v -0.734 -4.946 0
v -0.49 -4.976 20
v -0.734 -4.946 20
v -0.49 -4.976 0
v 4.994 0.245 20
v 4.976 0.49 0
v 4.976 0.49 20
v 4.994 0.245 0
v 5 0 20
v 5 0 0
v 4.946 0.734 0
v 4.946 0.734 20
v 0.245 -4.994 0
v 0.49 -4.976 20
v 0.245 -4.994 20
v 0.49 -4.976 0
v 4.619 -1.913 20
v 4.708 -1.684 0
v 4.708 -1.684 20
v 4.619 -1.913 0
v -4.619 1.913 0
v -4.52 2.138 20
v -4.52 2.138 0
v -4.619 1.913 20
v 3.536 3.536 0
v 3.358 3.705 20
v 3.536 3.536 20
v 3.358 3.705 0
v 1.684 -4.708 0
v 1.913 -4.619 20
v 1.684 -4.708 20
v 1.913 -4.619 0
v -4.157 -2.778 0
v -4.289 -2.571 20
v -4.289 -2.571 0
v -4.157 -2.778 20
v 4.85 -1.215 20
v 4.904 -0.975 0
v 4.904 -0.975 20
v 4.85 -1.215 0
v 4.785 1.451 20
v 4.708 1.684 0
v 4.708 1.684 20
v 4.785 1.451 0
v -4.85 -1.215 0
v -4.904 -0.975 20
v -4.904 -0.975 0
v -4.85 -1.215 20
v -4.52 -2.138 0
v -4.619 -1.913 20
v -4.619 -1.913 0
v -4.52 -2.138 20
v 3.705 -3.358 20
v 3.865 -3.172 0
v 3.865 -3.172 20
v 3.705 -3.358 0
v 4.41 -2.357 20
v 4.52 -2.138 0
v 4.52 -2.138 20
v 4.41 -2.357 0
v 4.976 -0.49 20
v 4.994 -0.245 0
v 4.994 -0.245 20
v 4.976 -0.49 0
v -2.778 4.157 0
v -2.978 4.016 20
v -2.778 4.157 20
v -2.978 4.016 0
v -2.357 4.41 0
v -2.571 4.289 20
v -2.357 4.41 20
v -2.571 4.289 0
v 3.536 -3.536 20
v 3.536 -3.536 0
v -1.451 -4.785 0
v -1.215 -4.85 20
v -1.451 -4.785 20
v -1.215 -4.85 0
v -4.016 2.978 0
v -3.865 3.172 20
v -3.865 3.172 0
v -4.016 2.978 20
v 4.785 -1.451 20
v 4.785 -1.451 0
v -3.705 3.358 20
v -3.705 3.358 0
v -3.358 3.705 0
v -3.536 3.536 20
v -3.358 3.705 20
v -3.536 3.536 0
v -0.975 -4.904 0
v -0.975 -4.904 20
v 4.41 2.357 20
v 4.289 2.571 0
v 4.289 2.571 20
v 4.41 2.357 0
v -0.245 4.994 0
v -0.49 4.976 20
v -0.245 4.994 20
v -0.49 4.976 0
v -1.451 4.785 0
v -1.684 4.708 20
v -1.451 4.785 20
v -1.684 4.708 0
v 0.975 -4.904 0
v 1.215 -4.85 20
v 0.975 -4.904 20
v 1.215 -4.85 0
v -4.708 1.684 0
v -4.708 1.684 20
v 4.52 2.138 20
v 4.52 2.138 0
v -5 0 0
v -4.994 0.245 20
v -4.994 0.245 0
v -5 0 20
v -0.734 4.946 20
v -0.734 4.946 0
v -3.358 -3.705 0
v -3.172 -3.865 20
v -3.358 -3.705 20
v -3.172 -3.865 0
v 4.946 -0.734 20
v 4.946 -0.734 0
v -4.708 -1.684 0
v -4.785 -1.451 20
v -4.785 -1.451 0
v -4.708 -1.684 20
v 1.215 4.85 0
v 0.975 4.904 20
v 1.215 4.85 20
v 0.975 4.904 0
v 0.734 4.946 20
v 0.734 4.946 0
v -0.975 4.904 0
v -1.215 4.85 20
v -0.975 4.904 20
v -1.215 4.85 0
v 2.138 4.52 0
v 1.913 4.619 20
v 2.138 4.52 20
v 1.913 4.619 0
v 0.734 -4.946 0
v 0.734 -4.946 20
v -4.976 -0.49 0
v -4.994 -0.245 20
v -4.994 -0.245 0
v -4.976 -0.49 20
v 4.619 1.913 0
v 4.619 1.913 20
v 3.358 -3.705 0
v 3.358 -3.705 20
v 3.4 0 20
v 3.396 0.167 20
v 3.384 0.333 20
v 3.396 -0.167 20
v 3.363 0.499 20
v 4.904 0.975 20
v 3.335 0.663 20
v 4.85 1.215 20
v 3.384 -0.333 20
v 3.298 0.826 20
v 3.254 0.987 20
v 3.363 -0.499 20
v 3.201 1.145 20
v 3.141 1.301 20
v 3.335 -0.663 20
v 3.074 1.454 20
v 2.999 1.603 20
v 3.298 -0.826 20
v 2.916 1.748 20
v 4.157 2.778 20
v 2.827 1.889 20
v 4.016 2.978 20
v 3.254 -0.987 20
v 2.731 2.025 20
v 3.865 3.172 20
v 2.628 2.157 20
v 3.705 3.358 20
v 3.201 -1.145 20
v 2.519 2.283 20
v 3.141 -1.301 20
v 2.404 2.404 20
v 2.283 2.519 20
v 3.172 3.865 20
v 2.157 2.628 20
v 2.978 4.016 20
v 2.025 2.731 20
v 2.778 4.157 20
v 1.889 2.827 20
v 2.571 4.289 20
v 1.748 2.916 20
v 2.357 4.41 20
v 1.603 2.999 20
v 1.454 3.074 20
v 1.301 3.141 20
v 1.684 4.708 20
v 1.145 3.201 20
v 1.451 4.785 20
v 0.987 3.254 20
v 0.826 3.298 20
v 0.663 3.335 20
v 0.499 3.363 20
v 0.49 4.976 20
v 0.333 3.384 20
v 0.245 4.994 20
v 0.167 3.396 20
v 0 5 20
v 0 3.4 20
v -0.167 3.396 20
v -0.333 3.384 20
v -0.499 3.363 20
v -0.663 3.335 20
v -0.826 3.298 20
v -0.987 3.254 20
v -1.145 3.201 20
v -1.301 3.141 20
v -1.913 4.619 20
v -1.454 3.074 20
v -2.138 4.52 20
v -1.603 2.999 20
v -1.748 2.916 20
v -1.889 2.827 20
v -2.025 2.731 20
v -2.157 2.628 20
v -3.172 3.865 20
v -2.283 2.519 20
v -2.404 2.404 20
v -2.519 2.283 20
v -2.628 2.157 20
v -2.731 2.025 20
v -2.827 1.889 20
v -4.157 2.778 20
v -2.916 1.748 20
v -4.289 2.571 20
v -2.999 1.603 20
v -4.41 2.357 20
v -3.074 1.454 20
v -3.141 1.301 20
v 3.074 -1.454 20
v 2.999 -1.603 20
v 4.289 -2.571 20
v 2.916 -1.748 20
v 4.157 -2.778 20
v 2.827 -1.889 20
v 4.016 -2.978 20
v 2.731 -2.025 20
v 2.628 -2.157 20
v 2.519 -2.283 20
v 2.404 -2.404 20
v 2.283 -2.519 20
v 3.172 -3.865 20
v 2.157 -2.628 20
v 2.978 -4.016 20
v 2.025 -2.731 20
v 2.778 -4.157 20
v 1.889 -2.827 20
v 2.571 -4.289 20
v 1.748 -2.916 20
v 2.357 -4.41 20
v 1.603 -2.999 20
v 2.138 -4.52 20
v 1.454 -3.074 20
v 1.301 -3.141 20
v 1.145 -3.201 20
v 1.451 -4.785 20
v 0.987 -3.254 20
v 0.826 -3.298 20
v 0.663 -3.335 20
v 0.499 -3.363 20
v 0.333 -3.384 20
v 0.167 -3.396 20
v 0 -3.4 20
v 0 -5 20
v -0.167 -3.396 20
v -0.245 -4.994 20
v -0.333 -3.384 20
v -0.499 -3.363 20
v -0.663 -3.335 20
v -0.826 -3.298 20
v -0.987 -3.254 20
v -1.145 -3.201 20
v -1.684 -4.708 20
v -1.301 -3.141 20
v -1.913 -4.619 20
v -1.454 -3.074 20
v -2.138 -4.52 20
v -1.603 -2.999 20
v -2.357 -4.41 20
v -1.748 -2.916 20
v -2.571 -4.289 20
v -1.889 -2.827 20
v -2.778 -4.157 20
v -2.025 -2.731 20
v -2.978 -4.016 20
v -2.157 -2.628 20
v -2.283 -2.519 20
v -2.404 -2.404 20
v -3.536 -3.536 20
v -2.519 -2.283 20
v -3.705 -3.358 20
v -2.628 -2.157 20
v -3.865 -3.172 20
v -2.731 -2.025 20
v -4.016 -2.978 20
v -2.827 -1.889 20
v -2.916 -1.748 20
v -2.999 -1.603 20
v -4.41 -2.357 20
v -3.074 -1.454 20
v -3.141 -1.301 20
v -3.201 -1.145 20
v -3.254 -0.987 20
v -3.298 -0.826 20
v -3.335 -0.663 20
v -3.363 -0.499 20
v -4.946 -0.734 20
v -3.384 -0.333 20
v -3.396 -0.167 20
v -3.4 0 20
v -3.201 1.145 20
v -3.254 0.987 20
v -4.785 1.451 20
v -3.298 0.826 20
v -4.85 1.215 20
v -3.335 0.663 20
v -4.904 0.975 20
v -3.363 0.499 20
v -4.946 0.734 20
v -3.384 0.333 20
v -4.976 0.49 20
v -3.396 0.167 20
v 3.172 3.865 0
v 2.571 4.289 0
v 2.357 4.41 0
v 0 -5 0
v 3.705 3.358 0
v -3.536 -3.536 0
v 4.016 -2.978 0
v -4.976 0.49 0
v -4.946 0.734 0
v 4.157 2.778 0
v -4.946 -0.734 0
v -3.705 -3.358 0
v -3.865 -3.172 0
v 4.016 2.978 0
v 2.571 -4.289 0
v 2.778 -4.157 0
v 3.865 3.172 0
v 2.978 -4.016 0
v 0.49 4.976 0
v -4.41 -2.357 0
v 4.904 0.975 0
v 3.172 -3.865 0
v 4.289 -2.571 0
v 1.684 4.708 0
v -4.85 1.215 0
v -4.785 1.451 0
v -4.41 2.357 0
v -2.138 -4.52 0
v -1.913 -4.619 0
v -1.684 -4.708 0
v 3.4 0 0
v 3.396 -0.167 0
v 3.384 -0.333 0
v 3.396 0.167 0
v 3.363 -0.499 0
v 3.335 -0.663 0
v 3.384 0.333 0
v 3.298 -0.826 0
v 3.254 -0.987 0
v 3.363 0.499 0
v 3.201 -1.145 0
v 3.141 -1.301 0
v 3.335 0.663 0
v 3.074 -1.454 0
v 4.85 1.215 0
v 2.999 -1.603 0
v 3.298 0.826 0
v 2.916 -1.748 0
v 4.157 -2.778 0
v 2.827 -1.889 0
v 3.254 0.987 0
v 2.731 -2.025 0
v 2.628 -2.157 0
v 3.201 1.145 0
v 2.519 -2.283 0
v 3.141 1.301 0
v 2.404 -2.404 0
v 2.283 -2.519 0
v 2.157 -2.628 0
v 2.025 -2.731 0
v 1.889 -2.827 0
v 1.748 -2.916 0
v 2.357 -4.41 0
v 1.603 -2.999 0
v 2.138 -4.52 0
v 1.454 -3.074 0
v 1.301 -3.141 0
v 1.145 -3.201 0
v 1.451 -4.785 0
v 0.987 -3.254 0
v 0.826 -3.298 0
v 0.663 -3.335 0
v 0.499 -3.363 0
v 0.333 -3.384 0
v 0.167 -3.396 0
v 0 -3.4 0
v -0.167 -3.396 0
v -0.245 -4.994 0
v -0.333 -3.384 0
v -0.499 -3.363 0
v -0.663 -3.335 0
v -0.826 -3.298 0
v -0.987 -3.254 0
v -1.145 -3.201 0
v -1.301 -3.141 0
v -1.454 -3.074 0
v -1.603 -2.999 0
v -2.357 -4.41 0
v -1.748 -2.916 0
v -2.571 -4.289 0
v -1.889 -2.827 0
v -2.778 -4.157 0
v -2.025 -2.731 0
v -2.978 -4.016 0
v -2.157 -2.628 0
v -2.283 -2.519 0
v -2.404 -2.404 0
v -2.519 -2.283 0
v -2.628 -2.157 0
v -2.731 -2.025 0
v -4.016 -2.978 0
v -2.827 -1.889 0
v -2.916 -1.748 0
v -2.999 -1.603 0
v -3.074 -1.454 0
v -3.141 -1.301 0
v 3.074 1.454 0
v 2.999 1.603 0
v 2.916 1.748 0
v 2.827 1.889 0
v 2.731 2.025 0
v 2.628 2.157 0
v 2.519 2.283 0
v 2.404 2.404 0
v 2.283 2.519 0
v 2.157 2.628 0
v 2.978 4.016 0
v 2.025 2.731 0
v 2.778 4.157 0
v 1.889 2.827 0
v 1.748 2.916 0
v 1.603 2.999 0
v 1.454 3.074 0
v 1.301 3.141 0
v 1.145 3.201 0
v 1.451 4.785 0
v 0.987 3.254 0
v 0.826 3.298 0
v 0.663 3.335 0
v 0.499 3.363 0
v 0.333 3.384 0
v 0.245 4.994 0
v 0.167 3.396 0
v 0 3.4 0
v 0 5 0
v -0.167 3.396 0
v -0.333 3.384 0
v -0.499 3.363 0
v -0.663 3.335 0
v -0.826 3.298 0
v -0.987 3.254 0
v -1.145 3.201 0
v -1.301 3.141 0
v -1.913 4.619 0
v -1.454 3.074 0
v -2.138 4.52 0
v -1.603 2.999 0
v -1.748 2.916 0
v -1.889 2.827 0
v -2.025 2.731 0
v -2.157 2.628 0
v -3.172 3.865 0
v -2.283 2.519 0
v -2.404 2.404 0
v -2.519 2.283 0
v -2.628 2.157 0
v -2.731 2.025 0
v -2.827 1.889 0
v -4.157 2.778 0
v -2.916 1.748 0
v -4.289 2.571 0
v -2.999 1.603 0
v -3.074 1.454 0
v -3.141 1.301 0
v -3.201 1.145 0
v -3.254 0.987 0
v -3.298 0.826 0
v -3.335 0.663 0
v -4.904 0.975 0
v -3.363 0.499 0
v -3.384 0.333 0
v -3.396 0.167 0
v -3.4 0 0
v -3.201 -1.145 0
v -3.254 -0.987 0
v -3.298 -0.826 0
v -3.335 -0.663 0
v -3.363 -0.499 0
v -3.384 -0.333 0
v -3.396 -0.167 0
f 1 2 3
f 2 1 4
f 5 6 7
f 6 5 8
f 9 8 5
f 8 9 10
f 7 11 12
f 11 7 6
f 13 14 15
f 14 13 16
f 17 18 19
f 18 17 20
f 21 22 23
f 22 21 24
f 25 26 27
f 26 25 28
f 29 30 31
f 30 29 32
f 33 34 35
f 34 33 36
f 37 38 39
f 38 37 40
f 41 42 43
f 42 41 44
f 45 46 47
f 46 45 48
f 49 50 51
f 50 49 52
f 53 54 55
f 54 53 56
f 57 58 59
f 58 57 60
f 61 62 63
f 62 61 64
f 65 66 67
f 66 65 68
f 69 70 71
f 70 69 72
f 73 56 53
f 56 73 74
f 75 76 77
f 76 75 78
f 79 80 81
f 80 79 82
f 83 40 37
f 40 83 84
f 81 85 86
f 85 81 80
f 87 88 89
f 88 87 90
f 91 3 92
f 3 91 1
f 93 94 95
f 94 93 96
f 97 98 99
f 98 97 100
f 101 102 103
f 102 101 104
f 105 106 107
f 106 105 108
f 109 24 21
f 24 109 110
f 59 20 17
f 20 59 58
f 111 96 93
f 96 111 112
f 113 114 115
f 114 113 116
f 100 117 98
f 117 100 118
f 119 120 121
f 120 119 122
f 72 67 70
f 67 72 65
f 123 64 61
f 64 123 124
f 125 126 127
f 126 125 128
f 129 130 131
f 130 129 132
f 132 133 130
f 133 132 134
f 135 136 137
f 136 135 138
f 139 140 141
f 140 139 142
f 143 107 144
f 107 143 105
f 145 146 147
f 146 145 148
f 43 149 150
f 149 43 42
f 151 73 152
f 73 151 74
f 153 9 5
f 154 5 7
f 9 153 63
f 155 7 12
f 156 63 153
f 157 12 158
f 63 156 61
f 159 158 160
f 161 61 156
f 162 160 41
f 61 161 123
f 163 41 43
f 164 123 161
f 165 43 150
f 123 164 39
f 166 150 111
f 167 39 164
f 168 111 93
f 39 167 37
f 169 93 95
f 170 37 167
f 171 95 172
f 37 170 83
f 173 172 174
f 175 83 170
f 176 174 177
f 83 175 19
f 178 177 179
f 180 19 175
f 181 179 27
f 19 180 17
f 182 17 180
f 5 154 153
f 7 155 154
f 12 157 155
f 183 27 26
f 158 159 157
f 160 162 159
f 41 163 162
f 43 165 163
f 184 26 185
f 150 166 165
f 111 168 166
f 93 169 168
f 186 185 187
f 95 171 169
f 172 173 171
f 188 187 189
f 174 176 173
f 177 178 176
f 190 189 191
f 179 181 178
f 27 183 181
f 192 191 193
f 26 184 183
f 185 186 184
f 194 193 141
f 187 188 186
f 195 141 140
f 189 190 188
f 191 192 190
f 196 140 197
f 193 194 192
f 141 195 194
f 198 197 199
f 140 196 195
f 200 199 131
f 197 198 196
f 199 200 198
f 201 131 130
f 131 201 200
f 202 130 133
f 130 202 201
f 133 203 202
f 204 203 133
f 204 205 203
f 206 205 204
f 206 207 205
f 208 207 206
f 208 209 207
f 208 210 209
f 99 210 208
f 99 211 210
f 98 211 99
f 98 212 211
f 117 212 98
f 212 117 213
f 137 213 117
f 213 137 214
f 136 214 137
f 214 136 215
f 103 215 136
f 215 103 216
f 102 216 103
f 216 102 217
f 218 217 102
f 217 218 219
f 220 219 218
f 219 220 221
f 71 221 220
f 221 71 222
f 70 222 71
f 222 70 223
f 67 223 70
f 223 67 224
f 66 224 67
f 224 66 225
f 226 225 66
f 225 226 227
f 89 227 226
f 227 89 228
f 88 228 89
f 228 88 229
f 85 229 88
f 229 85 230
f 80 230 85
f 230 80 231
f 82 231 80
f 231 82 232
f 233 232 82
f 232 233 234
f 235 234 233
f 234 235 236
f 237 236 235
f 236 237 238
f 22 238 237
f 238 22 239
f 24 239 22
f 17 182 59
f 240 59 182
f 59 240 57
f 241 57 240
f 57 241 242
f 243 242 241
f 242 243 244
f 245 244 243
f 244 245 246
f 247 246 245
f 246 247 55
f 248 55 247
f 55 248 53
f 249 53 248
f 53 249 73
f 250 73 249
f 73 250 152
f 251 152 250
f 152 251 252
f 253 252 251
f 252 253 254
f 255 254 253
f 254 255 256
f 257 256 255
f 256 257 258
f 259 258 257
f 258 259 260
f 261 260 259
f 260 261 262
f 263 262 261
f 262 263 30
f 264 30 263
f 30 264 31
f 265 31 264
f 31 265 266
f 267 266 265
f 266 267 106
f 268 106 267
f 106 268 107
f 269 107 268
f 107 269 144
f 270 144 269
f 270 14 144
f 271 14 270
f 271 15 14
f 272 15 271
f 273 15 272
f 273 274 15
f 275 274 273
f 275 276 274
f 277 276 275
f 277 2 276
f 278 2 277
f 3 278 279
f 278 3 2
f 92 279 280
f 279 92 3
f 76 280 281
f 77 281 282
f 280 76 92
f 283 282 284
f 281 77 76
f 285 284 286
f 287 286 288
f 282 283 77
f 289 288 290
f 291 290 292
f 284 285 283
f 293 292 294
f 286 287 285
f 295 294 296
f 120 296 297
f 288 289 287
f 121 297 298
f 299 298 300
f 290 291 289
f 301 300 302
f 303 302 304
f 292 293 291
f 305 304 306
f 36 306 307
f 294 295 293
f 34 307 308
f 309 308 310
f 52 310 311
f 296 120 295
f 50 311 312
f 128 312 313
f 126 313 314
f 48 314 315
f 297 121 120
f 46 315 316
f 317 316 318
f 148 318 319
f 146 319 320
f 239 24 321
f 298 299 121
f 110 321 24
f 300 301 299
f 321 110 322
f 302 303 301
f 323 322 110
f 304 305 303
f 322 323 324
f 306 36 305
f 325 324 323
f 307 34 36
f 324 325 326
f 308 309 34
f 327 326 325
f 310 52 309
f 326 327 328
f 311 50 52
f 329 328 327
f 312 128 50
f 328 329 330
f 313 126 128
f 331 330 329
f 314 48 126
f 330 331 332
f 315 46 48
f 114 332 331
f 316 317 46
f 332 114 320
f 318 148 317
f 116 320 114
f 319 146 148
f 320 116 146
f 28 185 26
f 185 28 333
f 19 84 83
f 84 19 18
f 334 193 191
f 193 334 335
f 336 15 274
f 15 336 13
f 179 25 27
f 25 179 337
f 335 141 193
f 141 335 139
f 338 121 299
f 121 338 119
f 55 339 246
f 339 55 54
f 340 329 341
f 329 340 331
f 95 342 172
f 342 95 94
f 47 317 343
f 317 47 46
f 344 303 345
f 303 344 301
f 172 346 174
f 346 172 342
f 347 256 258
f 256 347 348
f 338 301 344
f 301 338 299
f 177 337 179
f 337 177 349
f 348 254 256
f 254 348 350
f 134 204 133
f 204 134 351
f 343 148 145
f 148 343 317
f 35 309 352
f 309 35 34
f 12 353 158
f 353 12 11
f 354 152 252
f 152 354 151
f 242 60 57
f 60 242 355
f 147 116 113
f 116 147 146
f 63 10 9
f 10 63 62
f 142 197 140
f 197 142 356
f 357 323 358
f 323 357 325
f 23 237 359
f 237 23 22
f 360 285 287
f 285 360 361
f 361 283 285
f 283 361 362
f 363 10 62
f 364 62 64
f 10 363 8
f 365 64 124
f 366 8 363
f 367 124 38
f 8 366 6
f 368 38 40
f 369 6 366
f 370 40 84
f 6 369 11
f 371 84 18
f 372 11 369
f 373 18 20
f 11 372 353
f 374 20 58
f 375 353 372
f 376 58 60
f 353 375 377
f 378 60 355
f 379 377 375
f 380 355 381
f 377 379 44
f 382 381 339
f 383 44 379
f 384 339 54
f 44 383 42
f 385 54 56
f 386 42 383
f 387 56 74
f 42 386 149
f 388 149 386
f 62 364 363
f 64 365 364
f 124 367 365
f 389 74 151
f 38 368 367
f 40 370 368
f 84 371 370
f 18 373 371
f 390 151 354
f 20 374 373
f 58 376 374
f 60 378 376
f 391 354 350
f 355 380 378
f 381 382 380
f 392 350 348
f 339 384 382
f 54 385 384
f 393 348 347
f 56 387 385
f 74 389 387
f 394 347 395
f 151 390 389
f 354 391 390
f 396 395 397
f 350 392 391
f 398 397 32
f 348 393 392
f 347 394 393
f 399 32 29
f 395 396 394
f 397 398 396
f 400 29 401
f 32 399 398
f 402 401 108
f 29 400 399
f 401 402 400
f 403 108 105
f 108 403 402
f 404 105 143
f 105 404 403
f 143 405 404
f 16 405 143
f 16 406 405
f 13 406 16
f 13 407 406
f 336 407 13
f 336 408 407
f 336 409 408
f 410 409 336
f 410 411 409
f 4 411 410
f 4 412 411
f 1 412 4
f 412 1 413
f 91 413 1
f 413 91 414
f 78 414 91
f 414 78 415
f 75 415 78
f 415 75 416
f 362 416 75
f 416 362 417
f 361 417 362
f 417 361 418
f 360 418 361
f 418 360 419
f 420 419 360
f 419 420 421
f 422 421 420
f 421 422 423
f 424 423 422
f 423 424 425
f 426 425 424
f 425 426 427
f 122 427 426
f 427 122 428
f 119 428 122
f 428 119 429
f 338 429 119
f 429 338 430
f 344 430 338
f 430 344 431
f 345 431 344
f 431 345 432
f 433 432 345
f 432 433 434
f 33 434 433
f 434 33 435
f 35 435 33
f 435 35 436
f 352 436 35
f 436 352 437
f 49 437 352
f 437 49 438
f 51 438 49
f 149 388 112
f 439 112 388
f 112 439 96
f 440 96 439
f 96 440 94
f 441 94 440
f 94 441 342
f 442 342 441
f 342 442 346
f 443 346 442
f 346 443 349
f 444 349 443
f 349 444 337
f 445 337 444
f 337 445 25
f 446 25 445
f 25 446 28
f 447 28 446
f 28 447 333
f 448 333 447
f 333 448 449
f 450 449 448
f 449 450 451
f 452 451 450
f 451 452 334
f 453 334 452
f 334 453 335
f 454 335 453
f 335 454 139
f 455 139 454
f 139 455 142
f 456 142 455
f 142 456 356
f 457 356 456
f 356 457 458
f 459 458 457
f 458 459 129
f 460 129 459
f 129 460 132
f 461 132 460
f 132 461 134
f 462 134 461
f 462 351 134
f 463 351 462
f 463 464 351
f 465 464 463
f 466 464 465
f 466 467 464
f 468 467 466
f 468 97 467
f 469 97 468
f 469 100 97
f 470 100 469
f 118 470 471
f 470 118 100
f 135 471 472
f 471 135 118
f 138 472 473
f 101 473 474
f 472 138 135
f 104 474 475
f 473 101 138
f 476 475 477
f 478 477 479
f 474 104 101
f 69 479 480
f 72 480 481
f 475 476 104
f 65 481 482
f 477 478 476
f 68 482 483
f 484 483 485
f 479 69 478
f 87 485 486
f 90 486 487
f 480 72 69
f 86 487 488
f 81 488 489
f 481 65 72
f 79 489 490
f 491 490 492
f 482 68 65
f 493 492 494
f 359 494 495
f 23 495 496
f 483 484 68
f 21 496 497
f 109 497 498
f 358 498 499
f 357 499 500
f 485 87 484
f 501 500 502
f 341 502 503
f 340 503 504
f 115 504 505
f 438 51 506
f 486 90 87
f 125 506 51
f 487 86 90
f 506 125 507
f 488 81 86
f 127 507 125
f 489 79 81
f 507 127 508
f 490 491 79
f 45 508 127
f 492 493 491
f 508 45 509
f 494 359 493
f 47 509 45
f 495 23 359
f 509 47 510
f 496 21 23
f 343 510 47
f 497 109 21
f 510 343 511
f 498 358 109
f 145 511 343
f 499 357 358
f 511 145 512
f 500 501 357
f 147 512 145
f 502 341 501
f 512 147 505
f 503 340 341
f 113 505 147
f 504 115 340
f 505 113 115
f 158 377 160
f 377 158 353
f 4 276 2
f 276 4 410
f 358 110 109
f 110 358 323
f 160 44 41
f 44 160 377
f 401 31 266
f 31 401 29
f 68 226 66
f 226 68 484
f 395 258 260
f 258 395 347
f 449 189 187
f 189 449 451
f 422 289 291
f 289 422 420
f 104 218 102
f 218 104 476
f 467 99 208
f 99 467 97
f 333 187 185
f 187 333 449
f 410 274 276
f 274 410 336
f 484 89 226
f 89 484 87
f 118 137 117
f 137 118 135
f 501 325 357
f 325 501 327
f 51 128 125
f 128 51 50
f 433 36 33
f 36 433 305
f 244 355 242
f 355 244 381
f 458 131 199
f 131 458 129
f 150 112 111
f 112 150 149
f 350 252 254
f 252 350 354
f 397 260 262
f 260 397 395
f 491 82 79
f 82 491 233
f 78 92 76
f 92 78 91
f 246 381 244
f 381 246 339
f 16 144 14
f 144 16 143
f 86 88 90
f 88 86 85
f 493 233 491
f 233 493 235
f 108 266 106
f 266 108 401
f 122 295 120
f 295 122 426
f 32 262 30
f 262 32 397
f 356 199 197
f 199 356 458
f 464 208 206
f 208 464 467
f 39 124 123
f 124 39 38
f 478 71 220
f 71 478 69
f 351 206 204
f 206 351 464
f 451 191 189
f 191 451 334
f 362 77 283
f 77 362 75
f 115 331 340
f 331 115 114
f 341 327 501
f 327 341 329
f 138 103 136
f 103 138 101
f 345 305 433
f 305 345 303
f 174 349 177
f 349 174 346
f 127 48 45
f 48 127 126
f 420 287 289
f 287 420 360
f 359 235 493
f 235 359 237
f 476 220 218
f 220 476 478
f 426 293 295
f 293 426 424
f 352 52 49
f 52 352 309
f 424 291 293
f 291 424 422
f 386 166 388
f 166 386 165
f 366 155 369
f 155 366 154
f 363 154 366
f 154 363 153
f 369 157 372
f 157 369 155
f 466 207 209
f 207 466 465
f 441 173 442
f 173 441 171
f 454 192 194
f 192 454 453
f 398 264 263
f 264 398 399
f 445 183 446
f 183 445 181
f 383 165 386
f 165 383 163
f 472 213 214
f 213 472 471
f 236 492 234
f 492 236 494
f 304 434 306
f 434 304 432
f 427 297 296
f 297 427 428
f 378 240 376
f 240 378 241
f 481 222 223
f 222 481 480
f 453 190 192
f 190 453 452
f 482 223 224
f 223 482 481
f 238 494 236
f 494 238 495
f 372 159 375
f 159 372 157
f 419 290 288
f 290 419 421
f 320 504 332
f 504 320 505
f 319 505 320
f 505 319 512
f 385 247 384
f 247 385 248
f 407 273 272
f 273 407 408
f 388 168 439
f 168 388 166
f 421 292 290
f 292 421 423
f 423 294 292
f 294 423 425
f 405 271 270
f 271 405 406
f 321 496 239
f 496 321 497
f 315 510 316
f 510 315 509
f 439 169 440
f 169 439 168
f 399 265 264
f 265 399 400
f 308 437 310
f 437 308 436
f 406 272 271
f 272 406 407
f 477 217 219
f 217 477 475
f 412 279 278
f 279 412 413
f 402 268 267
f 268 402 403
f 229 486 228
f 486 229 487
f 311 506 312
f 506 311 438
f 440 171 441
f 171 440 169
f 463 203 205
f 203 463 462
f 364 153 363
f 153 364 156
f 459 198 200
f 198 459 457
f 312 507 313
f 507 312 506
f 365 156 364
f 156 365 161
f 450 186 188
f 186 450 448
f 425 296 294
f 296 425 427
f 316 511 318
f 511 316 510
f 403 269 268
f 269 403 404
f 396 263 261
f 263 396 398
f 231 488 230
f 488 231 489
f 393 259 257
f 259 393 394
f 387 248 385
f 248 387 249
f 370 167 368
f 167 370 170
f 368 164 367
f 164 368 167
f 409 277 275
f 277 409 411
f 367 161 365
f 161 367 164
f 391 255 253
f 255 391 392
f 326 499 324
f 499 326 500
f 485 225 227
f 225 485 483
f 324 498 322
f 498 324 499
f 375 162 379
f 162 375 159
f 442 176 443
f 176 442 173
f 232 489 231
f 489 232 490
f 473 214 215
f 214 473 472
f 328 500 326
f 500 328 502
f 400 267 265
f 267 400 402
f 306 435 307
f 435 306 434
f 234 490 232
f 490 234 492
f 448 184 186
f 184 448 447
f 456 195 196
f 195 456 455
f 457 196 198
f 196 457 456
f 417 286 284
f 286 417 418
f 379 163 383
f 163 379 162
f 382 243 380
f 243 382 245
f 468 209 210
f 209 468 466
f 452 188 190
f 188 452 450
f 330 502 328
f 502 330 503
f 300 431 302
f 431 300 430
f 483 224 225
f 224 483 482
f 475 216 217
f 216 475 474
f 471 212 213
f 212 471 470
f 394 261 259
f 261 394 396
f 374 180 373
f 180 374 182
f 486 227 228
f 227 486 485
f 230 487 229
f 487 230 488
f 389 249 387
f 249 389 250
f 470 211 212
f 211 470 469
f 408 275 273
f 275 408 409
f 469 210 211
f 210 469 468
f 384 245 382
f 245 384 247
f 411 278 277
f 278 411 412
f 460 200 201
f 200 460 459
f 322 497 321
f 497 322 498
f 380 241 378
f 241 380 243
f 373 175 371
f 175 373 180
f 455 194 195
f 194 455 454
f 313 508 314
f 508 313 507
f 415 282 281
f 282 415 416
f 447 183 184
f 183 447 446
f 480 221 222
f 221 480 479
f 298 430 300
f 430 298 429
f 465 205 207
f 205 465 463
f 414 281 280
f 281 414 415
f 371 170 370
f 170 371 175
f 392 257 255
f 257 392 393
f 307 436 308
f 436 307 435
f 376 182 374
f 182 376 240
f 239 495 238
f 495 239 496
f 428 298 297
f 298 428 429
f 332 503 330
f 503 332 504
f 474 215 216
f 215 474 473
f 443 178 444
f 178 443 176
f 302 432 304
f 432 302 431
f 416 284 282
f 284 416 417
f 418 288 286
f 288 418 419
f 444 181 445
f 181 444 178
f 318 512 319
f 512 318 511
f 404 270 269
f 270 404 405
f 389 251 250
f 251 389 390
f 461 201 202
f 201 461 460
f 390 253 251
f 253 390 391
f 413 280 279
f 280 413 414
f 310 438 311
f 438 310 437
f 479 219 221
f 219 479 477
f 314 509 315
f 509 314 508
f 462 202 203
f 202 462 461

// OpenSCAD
// Small lab funnel - printed upright, open top and bottom
// Units: mm. One complete part, no external libraries.

// ---- Parameters ----
spout_od      = 10;    // spout outer diameter
spout_length  = 20;    // spout runs from z = 0 to z = 20
cone_base_d   = 60;    // cone rim (base) outer diameter at z = 50
cone_top_d    = 10;    // cone outer diameter where it meets the spout (z = 20)
cone_height   = 30;    // cone runs from z = 20 to z = 50 (50 - 20)
wall          = 1.6;   // uniform wall thickness for spout and cone
eps           = 0.5;   // cutter overshoot past faces

$fn = 128;             // smoothness of curved surfaces

// ---- Derived ----
spout_id = spout_od - 2 * wall;   // spout bore diameter (6.8 mm)

// ---- Model ----
union() {
    // Straight spout: tube from z = 0 to z = 20
    difference() {
        cylinder(d = spout_od, h = spout_length);
        translate([0, 0, -eps])
            cylinder(d = spout_id, h = spout_length + 2 * eps);
    }

    // Cone: widens from 10 mm at z = 20 to 60 mm at z = 50
    // rotate_extrude maps 2D y -> z, so the profile spans z = 20..50
    rotate_extrude()
        translate([0, cone_top_d / 2, cone_height])
            difference() {
                circle(d = cone_base_d);
                translate([0, -eps])
                    circle(d = cone_base_d - 2 * wall);
            }
}
